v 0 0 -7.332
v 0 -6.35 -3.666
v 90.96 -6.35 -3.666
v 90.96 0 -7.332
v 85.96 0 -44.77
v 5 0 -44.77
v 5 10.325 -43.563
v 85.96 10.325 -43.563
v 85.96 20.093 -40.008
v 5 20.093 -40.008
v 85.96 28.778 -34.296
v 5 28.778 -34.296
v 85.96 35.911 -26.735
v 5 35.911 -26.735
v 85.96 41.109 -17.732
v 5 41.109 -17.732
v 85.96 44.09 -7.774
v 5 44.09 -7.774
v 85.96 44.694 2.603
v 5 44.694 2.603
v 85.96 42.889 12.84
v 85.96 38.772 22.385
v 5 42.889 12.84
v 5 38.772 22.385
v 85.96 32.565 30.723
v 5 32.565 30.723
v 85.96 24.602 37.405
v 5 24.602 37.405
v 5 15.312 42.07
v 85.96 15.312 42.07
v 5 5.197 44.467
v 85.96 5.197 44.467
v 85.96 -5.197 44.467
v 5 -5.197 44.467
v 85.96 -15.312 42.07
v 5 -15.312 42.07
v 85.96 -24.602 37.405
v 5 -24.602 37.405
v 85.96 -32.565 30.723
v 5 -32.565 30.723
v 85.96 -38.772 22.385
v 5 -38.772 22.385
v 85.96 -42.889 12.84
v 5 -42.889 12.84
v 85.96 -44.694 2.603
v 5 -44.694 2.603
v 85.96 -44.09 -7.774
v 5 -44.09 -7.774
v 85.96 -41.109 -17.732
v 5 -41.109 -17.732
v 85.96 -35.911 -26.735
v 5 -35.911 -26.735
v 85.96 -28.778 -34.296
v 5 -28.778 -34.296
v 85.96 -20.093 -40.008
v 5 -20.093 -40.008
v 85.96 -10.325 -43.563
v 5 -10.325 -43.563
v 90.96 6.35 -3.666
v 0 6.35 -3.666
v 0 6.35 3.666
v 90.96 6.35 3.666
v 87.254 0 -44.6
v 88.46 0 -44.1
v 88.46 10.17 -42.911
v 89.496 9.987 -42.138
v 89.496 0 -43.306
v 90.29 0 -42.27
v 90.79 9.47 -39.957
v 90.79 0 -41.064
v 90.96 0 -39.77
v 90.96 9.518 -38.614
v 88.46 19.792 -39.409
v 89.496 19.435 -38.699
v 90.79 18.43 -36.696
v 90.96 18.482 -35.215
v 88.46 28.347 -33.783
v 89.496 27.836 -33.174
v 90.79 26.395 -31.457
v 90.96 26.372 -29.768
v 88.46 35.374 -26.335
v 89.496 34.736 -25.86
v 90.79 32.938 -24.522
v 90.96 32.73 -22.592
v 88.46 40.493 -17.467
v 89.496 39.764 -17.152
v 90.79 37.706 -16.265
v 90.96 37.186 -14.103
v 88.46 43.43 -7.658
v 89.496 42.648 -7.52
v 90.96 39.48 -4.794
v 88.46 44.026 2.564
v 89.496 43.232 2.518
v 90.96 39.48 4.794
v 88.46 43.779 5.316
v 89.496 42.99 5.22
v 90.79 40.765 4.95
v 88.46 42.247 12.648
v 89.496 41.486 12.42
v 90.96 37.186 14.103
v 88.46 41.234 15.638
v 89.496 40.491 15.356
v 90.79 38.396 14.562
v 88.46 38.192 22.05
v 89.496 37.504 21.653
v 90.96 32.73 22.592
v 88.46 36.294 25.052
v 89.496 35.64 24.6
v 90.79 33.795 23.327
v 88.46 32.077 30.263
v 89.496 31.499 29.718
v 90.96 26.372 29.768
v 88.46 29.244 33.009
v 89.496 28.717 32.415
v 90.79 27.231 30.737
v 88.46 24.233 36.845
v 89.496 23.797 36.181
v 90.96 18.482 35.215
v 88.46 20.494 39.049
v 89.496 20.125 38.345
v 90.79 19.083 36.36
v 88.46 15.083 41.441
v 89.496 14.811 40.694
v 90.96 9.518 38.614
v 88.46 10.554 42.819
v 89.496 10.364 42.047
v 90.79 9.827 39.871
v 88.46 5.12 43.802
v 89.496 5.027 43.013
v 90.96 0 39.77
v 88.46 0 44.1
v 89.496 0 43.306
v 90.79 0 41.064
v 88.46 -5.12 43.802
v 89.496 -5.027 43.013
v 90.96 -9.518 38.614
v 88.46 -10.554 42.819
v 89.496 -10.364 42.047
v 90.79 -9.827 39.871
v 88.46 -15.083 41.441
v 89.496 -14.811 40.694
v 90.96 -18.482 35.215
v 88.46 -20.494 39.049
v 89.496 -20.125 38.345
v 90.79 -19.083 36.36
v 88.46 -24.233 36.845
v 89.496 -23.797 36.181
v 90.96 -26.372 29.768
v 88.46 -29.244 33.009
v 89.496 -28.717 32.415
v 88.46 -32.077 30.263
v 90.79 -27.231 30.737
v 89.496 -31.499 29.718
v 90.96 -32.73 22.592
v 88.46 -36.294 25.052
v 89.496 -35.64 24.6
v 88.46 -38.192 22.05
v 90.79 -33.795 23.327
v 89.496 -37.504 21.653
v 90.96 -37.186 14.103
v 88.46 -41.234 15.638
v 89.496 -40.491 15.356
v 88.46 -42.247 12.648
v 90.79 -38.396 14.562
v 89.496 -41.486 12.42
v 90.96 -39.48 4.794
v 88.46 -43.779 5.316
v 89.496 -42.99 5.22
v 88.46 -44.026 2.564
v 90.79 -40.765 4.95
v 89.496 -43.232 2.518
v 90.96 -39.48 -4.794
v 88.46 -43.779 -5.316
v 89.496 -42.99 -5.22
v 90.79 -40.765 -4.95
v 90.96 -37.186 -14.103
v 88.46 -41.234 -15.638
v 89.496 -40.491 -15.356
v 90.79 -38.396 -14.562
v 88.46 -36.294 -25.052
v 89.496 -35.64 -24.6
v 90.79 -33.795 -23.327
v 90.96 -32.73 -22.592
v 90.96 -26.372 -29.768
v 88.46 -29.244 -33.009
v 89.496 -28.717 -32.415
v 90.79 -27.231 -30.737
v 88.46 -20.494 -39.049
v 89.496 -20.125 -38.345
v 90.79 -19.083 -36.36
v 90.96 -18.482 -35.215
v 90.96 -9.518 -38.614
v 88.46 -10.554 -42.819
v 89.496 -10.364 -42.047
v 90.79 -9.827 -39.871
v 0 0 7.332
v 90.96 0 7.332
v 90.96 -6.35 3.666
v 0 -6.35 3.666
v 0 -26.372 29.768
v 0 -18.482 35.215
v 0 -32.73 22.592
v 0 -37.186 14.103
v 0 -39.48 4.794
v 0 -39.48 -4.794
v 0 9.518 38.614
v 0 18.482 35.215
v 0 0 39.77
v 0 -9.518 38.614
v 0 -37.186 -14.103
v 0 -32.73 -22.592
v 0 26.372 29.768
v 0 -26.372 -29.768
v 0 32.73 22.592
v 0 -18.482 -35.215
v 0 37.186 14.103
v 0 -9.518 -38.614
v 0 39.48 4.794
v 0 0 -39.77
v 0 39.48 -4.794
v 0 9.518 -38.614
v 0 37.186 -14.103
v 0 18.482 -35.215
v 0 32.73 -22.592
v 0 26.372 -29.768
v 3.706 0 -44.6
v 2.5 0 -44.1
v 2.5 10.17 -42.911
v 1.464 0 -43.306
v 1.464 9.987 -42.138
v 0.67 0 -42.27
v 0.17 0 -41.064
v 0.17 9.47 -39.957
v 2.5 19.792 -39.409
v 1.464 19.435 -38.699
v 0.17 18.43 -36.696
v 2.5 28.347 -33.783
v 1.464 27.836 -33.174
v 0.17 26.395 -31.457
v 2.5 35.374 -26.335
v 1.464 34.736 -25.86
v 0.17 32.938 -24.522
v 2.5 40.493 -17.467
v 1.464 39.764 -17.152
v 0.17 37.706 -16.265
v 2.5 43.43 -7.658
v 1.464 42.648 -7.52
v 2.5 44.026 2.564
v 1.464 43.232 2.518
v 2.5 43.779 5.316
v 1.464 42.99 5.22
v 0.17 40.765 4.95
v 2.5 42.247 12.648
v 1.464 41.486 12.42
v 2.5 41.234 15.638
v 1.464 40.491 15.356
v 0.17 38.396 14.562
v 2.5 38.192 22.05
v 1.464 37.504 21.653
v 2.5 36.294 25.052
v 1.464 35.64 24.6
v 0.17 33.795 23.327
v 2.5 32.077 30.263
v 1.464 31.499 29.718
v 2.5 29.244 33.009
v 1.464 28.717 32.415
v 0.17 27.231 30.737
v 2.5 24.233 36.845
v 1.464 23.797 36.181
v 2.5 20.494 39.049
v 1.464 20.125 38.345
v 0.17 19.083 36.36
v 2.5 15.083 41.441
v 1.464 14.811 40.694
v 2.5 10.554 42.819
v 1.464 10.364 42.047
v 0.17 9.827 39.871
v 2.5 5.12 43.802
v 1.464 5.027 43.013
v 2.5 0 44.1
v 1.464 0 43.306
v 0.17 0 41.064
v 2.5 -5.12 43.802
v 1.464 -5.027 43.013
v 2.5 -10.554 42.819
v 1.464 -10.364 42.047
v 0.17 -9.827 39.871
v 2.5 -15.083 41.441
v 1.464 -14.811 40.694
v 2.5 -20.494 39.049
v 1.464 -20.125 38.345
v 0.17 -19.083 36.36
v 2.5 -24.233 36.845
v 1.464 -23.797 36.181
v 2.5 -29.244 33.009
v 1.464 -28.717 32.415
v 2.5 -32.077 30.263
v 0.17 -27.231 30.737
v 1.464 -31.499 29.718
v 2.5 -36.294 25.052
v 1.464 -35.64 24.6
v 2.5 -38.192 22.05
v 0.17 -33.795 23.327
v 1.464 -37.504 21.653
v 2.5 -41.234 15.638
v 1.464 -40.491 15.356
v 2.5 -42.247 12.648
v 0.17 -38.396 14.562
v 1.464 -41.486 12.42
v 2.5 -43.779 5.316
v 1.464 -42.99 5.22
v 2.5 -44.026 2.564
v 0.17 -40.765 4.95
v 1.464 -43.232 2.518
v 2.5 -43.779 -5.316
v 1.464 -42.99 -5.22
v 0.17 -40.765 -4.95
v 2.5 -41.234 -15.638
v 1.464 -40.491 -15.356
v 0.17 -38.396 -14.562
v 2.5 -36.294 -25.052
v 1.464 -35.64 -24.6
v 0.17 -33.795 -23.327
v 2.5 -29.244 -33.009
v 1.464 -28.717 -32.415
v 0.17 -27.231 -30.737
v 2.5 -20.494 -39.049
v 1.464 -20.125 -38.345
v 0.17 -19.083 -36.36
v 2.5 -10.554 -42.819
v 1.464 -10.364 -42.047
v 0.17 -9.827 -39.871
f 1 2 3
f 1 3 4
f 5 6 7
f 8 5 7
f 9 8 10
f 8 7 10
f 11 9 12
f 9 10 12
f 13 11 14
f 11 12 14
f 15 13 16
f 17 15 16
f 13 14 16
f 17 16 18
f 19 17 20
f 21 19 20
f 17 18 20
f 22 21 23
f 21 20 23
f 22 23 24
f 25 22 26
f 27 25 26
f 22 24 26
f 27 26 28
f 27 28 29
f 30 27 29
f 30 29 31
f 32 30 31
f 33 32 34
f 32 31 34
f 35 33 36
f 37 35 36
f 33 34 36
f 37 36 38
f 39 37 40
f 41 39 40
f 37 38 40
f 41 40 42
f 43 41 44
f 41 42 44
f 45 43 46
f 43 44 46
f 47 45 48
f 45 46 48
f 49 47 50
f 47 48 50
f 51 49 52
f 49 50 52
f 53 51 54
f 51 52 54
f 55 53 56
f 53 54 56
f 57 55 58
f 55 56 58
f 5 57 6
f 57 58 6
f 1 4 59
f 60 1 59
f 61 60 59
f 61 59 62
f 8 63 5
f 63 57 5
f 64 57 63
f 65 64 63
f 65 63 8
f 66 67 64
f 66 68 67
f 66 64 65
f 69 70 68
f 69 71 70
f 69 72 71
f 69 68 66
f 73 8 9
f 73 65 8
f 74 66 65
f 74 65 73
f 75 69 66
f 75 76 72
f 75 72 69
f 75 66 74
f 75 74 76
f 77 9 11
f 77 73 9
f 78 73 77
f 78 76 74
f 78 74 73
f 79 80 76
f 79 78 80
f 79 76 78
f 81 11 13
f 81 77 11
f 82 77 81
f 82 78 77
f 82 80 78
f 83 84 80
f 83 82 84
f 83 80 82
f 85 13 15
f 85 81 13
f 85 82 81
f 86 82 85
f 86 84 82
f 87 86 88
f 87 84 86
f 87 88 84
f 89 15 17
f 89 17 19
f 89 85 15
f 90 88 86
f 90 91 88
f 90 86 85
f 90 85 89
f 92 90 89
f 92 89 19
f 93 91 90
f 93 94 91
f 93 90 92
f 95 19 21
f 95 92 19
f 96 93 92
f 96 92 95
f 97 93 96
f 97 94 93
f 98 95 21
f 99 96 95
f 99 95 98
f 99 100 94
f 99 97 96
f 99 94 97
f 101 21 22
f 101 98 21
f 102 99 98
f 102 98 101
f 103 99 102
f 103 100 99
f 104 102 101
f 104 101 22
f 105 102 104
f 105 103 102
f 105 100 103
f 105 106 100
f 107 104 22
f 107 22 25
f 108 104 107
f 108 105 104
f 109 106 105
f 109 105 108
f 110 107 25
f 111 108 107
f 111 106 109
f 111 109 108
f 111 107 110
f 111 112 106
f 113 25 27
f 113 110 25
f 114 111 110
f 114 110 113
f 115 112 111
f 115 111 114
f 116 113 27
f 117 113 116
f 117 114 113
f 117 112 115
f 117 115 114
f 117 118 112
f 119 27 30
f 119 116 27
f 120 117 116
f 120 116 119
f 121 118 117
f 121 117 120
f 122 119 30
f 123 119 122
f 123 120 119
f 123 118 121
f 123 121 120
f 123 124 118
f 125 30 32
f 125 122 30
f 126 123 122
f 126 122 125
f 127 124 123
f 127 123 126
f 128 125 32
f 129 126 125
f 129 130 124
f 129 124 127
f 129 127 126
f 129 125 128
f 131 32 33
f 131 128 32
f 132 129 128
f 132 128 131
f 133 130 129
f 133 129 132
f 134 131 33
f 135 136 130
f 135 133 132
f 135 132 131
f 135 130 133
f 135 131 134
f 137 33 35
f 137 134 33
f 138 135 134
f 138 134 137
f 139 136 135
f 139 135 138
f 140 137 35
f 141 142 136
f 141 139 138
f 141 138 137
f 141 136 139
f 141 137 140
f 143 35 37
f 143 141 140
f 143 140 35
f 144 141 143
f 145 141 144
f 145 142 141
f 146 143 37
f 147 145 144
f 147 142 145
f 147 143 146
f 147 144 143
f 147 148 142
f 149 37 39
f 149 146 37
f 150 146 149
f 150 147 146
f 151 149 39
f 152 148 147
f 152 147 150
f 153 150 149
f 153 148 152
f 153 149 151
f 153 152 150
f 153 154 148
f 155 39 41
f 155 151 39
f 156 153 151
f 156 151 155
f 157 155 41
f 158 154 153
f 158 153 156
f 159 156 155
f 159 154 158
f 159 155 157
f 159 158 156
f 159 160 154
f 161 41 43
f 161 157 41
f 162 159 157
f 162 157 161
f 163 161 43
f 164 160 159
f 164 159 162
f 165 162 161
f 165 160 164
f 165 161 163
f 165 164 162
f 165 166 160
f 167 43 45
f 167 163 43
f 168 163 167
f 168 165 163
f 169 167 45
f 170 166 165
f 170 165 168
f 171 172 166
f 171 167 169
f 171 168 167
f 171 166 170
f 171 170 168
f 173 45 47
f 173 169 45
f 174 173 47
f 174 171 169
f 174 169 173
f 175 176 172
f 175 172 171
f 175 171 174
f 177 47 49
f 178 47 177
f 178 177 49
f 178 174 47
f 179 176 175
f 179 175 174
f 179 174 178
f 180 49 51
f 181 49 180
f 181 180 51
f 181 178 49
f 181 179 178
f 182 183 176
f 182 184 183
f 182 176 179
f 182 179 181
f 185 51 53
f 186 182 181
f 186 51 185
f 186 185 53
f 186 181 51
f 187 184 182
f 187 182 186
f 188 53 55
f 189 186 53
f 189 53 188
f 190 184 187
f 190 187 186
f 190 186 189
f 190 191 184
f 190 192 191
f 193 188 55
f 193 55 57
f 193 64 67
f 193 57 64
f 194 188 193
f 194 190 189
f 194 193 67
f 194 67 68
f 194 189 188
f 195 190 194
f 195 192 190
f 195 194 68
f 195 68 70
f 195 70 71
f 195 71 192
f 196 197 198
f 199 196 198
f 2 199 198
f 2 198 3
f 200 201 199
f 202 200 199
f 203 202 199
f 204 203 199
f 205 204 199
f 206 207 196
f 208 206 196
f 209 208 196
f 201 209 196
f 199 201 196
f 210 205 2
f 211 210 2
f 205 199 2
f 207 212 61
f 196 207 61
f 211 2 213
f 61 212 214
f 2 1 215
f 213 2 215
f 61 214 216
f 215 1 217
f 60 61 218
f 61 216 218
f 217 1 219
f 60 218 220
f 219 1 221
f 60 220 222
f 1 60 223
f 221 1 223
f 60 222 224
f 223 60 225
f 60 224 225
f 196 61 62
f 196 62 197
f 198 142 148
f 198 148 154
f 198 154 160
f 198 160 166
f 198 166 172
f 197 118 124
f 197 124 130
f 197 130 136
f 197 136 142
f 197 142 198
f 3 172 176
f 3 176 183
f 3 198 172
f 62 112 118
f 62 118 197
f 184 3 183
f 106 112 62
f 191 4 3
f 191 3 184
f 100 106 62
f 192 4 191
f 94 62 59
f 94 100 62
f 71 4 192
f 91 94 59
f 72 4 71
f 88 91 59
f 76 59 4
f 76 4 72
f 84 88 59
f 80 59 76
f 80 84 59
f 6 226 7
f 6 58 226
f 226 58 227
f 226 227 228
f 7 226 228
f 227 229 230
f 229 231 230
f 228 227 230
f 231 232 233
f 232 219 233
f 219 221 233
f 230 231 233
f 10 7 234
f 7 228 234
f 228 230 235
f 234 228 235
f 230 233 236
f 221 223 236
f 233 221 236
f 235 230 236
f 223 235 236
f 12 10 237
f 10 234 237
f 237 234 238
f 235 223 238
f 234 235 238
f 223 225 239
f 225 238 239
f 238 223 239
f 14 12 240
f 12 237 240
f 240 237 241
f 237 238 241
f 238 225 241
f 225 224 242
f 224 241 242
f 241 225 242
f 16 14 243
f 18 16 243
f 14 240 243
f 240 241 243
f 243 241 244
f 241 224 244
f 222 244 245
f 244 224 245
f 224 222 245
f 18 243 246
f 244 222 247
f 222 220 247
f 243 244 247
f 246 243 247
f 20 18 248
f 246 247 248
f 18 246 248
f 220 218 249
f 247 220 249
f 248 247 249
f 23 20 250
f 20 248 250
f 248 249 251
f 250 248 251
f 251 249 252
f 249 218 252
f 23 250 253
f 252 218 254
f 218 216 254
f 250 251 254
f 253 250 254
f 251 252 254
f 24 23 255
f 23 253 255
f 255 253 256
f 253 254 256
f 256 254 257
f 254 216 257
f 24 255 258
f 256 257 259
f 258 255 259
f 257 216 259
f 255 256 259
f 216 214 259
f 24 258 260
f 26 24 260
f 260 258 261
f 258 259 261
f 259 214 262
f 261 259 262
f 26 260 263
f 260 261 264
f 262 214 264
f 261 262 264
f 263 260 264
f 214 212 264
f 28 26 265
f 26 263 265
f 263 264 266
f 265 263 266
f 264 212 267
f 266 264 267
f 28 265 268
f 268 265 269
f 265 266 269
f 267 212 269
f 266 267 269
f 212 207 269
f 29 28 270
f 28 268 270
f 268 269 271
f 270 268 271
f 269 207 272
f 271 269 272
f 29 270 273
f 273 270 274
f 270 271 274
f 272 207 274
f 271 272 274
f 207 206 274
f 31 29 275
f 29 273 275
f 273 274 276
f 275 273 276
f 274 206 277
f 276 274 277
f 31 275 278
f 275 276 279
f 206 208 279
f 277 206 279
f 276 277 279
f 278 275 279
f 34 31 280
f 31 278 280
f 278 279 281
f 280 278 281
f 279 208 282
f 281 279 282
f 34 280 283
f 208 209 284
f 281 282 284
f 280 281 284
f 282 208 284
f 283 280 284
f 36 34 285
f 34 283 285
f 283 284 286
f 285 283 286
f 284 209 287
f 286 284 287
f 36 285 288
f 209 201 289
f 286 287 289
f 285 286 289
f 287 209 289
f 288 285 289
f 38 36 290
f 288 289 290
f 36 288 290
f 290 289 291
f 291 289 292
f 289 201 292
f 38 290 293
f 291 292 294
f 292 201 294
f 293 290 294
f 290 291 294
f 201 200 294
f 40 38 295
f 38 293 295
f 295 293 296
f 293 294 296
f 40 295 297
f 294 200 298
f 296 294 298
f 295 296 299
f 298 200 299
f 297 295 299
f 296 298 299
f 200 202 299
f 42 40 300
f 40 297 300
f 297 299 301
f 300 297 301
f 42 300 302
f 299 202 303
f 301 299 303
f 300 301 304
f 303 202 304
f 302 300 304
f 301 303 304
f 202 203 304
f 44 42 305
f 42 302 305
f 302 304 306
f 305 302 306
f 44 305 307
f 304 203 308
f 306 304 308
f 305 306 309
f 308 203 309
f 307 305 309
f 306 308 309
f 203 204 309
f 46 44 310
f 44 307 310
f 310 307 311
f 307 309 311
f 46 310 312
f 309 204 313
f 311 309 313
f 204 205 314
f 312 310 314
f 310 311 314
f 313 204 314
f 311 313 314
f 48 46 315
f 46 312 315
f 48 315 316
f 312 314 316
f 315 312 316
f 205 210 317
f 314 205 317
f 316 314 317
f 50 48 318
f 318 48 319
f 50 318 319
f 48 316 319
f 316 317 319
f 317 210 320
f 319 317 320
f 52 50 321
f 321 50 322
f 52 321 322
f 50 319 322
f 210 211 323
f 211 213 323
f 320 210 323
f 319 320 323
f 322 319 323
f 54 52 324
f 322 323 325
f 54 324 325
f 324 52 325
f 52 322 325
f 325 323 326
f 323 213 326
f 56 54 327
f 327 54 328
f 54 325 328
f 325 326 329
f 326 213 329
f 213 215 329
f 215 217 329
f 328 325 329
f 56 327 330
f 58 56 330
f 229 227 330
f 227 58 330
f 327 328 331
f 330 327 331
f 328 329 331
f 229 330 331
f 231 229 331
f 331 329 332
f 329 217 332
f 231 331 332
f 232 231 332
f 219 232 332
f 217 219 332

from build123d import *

# Parameters (mm, degrees)
CROQUIS1_R              = 44.77
SALIENTE_EXTRUIR1_DEPTH = 90.96
REDONDEO1_R             = 5


with BuildPart() as part:
    # Croquis1 → Saliente-Extruir1 (new body)
    with BuildSketch(Plane(origin=(0, 0, 0), x_dir=(0, 0, -1), z_dir=(1, 0, 0))):
        Circle(CROQUIS1_R)
        Polygon((7.332348419, 0), (3.666174209, 6.35), (-3.666174209, 6.35), (-7.332348419, 0), (-3.666174209, -6.35), (3.666174209, -6.35), align=None, mode=Mode.SUBTRACT)
    extrude(amount=SALIENTE_EXTRUIR1_DEPTH)

    # Redondeo1
    redondeo1_edges = [part.edges().sort_by_distance(p)[0] for p in [
        (0, 0, 44.77),
        (90.96, 0, 44.77),
    ]]
    fillet(redondeo1_edges, radius=REDONDEO1_R)


solid = part.part
